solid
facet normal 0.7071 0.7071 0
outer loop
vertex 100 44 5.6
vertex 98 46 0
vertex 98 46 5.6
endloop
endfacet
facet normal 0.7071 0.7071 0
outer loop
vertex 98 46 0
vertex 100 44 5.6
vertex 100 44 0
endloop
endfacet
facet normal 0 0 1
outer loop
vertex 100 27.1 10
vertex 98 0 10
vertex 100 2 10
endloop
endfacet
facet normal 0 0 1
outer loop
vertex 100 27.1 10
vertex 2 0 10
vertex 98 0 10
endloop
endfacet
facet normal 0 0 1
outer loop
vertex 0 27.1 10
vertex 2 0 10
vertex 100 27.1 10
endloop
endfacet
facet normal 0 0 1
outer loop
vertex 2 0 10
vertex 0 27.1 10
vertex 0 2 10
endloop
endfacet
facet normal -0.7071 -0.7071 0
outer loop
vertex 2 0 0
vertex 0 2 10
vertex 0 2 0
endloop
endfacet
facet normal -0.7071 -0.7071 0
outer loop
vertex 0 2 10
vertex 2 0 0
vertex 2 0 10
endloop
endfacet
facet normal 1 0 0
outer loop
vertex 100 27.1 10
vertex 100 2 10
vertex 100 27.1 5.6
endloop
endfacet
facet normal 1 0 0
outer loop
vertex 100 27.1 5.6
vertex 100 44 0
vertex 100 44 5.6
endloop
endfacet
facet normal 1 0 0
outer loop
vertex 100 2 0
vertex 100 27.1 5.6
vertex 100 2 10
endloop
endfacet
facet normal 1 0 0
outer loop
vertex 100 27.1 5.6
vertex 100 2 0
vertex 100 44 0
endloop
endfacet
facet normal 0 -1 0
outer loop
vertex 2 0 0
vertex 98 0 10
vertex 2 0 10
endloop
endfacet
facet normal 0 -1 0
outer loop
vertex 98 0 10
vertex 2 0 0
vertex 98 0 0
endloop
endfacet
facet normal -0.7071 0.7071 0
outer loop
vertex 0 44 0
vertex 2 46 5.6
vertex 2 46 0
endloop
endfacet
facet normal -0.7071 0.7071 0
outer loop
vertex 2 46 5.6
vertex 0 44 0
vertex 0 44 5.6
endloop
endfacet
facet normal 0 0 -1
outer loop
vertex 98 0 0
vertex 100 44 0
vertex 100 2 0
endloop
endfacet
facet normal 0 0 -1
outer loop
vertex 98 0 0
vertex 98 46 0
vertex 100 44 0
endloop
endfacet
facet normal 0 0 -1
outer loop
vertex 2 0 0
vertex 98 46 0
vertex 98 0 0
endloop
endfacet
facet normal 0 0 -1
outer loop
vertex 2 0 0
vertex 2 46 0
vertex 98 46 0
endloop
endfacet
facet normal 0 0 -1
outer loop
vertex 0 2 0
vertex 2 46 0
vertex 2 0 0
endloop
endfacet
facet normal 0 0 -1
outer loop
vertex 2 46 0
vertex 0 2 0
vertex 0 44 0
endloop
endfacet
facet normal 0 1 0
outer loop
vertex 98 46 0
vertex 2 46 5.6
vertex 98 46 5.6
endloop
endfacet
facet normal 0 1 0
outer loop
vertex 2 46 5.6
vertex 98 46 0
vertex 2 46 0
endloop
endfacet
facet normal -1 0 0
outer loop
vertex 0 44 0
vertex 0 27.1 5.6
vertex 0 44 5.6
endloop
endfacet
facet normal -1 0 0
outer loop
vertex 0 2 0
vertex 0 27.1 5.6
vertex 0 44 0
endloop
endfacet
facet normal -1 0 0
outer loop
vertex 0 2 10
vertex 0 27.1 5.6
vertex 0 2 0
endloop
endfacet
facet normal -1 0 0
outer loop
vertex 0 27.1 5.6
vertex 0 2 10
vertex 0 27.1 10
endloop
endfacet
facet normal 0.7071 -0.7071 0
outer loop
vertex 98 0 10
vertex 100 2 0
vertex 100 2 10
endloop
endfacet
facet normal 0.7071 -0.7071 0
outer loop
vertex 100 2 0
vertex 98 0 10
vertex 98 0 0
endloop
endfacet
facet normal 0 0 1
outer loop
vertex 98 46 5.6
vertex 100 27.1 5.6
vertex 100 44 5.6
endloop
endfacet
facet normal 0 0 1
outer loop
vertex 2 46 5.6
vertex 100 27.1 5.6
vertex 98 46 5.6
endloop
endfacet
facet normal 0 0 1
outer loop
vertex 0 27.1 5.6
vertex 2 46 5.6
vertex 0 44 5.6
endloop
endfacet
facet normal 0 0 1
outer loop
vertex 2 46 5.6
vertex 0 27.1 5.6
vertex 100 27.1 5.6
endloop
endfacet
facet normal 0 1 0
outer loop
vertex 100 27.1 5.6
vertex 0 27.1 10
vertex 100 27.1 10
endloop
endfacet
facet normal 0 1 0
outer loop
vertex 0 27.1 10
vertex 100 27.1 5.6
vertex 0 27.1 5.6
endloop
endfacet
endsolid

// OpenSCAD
$fn = 32;

// ----------------------------------------------------------------------
// Stepped bar: sidestep, 100 x 46 x 10/5.6 mm
// ----------------------------------------------------------------------

// --- parameters (mm) ---
bar_l = 100;              // bar length, X
bar_w = 46;               // bar width, Y
plate_t = 10;             // thickness of the thick zone, Z
thin_t = 5.6;             // thickness of the thin zone
corner_c = 2;             // corner chamfer of the bar
step_cut = 4.4;           // material removed from the thin zone
ledge_y = 27.1;           // start of the ledge from the front edge
depth_1 = 4.4;            // depth of cut 1 from the top face

profile = [[2, 0], [98, 0], [100, 2], [100, 44], [98, 46], [2, 46], [0, 44], [0, 2]];  // primary outline, 8 points, counter clockwise
void_1 = [[-1, 27.1], [101, 27.1], [101, 47], [-1, 47]];  // ledge cut along one edge, 4 points

// --- the one profile operation ---
difference() {
  linear_extrude(height = plate_t) polygon(points = profile);
  translate([0, 0, plate_t - depth_1])
    linear_extrude(height = depth_1 + 1) polygon(points = void_1);
}
